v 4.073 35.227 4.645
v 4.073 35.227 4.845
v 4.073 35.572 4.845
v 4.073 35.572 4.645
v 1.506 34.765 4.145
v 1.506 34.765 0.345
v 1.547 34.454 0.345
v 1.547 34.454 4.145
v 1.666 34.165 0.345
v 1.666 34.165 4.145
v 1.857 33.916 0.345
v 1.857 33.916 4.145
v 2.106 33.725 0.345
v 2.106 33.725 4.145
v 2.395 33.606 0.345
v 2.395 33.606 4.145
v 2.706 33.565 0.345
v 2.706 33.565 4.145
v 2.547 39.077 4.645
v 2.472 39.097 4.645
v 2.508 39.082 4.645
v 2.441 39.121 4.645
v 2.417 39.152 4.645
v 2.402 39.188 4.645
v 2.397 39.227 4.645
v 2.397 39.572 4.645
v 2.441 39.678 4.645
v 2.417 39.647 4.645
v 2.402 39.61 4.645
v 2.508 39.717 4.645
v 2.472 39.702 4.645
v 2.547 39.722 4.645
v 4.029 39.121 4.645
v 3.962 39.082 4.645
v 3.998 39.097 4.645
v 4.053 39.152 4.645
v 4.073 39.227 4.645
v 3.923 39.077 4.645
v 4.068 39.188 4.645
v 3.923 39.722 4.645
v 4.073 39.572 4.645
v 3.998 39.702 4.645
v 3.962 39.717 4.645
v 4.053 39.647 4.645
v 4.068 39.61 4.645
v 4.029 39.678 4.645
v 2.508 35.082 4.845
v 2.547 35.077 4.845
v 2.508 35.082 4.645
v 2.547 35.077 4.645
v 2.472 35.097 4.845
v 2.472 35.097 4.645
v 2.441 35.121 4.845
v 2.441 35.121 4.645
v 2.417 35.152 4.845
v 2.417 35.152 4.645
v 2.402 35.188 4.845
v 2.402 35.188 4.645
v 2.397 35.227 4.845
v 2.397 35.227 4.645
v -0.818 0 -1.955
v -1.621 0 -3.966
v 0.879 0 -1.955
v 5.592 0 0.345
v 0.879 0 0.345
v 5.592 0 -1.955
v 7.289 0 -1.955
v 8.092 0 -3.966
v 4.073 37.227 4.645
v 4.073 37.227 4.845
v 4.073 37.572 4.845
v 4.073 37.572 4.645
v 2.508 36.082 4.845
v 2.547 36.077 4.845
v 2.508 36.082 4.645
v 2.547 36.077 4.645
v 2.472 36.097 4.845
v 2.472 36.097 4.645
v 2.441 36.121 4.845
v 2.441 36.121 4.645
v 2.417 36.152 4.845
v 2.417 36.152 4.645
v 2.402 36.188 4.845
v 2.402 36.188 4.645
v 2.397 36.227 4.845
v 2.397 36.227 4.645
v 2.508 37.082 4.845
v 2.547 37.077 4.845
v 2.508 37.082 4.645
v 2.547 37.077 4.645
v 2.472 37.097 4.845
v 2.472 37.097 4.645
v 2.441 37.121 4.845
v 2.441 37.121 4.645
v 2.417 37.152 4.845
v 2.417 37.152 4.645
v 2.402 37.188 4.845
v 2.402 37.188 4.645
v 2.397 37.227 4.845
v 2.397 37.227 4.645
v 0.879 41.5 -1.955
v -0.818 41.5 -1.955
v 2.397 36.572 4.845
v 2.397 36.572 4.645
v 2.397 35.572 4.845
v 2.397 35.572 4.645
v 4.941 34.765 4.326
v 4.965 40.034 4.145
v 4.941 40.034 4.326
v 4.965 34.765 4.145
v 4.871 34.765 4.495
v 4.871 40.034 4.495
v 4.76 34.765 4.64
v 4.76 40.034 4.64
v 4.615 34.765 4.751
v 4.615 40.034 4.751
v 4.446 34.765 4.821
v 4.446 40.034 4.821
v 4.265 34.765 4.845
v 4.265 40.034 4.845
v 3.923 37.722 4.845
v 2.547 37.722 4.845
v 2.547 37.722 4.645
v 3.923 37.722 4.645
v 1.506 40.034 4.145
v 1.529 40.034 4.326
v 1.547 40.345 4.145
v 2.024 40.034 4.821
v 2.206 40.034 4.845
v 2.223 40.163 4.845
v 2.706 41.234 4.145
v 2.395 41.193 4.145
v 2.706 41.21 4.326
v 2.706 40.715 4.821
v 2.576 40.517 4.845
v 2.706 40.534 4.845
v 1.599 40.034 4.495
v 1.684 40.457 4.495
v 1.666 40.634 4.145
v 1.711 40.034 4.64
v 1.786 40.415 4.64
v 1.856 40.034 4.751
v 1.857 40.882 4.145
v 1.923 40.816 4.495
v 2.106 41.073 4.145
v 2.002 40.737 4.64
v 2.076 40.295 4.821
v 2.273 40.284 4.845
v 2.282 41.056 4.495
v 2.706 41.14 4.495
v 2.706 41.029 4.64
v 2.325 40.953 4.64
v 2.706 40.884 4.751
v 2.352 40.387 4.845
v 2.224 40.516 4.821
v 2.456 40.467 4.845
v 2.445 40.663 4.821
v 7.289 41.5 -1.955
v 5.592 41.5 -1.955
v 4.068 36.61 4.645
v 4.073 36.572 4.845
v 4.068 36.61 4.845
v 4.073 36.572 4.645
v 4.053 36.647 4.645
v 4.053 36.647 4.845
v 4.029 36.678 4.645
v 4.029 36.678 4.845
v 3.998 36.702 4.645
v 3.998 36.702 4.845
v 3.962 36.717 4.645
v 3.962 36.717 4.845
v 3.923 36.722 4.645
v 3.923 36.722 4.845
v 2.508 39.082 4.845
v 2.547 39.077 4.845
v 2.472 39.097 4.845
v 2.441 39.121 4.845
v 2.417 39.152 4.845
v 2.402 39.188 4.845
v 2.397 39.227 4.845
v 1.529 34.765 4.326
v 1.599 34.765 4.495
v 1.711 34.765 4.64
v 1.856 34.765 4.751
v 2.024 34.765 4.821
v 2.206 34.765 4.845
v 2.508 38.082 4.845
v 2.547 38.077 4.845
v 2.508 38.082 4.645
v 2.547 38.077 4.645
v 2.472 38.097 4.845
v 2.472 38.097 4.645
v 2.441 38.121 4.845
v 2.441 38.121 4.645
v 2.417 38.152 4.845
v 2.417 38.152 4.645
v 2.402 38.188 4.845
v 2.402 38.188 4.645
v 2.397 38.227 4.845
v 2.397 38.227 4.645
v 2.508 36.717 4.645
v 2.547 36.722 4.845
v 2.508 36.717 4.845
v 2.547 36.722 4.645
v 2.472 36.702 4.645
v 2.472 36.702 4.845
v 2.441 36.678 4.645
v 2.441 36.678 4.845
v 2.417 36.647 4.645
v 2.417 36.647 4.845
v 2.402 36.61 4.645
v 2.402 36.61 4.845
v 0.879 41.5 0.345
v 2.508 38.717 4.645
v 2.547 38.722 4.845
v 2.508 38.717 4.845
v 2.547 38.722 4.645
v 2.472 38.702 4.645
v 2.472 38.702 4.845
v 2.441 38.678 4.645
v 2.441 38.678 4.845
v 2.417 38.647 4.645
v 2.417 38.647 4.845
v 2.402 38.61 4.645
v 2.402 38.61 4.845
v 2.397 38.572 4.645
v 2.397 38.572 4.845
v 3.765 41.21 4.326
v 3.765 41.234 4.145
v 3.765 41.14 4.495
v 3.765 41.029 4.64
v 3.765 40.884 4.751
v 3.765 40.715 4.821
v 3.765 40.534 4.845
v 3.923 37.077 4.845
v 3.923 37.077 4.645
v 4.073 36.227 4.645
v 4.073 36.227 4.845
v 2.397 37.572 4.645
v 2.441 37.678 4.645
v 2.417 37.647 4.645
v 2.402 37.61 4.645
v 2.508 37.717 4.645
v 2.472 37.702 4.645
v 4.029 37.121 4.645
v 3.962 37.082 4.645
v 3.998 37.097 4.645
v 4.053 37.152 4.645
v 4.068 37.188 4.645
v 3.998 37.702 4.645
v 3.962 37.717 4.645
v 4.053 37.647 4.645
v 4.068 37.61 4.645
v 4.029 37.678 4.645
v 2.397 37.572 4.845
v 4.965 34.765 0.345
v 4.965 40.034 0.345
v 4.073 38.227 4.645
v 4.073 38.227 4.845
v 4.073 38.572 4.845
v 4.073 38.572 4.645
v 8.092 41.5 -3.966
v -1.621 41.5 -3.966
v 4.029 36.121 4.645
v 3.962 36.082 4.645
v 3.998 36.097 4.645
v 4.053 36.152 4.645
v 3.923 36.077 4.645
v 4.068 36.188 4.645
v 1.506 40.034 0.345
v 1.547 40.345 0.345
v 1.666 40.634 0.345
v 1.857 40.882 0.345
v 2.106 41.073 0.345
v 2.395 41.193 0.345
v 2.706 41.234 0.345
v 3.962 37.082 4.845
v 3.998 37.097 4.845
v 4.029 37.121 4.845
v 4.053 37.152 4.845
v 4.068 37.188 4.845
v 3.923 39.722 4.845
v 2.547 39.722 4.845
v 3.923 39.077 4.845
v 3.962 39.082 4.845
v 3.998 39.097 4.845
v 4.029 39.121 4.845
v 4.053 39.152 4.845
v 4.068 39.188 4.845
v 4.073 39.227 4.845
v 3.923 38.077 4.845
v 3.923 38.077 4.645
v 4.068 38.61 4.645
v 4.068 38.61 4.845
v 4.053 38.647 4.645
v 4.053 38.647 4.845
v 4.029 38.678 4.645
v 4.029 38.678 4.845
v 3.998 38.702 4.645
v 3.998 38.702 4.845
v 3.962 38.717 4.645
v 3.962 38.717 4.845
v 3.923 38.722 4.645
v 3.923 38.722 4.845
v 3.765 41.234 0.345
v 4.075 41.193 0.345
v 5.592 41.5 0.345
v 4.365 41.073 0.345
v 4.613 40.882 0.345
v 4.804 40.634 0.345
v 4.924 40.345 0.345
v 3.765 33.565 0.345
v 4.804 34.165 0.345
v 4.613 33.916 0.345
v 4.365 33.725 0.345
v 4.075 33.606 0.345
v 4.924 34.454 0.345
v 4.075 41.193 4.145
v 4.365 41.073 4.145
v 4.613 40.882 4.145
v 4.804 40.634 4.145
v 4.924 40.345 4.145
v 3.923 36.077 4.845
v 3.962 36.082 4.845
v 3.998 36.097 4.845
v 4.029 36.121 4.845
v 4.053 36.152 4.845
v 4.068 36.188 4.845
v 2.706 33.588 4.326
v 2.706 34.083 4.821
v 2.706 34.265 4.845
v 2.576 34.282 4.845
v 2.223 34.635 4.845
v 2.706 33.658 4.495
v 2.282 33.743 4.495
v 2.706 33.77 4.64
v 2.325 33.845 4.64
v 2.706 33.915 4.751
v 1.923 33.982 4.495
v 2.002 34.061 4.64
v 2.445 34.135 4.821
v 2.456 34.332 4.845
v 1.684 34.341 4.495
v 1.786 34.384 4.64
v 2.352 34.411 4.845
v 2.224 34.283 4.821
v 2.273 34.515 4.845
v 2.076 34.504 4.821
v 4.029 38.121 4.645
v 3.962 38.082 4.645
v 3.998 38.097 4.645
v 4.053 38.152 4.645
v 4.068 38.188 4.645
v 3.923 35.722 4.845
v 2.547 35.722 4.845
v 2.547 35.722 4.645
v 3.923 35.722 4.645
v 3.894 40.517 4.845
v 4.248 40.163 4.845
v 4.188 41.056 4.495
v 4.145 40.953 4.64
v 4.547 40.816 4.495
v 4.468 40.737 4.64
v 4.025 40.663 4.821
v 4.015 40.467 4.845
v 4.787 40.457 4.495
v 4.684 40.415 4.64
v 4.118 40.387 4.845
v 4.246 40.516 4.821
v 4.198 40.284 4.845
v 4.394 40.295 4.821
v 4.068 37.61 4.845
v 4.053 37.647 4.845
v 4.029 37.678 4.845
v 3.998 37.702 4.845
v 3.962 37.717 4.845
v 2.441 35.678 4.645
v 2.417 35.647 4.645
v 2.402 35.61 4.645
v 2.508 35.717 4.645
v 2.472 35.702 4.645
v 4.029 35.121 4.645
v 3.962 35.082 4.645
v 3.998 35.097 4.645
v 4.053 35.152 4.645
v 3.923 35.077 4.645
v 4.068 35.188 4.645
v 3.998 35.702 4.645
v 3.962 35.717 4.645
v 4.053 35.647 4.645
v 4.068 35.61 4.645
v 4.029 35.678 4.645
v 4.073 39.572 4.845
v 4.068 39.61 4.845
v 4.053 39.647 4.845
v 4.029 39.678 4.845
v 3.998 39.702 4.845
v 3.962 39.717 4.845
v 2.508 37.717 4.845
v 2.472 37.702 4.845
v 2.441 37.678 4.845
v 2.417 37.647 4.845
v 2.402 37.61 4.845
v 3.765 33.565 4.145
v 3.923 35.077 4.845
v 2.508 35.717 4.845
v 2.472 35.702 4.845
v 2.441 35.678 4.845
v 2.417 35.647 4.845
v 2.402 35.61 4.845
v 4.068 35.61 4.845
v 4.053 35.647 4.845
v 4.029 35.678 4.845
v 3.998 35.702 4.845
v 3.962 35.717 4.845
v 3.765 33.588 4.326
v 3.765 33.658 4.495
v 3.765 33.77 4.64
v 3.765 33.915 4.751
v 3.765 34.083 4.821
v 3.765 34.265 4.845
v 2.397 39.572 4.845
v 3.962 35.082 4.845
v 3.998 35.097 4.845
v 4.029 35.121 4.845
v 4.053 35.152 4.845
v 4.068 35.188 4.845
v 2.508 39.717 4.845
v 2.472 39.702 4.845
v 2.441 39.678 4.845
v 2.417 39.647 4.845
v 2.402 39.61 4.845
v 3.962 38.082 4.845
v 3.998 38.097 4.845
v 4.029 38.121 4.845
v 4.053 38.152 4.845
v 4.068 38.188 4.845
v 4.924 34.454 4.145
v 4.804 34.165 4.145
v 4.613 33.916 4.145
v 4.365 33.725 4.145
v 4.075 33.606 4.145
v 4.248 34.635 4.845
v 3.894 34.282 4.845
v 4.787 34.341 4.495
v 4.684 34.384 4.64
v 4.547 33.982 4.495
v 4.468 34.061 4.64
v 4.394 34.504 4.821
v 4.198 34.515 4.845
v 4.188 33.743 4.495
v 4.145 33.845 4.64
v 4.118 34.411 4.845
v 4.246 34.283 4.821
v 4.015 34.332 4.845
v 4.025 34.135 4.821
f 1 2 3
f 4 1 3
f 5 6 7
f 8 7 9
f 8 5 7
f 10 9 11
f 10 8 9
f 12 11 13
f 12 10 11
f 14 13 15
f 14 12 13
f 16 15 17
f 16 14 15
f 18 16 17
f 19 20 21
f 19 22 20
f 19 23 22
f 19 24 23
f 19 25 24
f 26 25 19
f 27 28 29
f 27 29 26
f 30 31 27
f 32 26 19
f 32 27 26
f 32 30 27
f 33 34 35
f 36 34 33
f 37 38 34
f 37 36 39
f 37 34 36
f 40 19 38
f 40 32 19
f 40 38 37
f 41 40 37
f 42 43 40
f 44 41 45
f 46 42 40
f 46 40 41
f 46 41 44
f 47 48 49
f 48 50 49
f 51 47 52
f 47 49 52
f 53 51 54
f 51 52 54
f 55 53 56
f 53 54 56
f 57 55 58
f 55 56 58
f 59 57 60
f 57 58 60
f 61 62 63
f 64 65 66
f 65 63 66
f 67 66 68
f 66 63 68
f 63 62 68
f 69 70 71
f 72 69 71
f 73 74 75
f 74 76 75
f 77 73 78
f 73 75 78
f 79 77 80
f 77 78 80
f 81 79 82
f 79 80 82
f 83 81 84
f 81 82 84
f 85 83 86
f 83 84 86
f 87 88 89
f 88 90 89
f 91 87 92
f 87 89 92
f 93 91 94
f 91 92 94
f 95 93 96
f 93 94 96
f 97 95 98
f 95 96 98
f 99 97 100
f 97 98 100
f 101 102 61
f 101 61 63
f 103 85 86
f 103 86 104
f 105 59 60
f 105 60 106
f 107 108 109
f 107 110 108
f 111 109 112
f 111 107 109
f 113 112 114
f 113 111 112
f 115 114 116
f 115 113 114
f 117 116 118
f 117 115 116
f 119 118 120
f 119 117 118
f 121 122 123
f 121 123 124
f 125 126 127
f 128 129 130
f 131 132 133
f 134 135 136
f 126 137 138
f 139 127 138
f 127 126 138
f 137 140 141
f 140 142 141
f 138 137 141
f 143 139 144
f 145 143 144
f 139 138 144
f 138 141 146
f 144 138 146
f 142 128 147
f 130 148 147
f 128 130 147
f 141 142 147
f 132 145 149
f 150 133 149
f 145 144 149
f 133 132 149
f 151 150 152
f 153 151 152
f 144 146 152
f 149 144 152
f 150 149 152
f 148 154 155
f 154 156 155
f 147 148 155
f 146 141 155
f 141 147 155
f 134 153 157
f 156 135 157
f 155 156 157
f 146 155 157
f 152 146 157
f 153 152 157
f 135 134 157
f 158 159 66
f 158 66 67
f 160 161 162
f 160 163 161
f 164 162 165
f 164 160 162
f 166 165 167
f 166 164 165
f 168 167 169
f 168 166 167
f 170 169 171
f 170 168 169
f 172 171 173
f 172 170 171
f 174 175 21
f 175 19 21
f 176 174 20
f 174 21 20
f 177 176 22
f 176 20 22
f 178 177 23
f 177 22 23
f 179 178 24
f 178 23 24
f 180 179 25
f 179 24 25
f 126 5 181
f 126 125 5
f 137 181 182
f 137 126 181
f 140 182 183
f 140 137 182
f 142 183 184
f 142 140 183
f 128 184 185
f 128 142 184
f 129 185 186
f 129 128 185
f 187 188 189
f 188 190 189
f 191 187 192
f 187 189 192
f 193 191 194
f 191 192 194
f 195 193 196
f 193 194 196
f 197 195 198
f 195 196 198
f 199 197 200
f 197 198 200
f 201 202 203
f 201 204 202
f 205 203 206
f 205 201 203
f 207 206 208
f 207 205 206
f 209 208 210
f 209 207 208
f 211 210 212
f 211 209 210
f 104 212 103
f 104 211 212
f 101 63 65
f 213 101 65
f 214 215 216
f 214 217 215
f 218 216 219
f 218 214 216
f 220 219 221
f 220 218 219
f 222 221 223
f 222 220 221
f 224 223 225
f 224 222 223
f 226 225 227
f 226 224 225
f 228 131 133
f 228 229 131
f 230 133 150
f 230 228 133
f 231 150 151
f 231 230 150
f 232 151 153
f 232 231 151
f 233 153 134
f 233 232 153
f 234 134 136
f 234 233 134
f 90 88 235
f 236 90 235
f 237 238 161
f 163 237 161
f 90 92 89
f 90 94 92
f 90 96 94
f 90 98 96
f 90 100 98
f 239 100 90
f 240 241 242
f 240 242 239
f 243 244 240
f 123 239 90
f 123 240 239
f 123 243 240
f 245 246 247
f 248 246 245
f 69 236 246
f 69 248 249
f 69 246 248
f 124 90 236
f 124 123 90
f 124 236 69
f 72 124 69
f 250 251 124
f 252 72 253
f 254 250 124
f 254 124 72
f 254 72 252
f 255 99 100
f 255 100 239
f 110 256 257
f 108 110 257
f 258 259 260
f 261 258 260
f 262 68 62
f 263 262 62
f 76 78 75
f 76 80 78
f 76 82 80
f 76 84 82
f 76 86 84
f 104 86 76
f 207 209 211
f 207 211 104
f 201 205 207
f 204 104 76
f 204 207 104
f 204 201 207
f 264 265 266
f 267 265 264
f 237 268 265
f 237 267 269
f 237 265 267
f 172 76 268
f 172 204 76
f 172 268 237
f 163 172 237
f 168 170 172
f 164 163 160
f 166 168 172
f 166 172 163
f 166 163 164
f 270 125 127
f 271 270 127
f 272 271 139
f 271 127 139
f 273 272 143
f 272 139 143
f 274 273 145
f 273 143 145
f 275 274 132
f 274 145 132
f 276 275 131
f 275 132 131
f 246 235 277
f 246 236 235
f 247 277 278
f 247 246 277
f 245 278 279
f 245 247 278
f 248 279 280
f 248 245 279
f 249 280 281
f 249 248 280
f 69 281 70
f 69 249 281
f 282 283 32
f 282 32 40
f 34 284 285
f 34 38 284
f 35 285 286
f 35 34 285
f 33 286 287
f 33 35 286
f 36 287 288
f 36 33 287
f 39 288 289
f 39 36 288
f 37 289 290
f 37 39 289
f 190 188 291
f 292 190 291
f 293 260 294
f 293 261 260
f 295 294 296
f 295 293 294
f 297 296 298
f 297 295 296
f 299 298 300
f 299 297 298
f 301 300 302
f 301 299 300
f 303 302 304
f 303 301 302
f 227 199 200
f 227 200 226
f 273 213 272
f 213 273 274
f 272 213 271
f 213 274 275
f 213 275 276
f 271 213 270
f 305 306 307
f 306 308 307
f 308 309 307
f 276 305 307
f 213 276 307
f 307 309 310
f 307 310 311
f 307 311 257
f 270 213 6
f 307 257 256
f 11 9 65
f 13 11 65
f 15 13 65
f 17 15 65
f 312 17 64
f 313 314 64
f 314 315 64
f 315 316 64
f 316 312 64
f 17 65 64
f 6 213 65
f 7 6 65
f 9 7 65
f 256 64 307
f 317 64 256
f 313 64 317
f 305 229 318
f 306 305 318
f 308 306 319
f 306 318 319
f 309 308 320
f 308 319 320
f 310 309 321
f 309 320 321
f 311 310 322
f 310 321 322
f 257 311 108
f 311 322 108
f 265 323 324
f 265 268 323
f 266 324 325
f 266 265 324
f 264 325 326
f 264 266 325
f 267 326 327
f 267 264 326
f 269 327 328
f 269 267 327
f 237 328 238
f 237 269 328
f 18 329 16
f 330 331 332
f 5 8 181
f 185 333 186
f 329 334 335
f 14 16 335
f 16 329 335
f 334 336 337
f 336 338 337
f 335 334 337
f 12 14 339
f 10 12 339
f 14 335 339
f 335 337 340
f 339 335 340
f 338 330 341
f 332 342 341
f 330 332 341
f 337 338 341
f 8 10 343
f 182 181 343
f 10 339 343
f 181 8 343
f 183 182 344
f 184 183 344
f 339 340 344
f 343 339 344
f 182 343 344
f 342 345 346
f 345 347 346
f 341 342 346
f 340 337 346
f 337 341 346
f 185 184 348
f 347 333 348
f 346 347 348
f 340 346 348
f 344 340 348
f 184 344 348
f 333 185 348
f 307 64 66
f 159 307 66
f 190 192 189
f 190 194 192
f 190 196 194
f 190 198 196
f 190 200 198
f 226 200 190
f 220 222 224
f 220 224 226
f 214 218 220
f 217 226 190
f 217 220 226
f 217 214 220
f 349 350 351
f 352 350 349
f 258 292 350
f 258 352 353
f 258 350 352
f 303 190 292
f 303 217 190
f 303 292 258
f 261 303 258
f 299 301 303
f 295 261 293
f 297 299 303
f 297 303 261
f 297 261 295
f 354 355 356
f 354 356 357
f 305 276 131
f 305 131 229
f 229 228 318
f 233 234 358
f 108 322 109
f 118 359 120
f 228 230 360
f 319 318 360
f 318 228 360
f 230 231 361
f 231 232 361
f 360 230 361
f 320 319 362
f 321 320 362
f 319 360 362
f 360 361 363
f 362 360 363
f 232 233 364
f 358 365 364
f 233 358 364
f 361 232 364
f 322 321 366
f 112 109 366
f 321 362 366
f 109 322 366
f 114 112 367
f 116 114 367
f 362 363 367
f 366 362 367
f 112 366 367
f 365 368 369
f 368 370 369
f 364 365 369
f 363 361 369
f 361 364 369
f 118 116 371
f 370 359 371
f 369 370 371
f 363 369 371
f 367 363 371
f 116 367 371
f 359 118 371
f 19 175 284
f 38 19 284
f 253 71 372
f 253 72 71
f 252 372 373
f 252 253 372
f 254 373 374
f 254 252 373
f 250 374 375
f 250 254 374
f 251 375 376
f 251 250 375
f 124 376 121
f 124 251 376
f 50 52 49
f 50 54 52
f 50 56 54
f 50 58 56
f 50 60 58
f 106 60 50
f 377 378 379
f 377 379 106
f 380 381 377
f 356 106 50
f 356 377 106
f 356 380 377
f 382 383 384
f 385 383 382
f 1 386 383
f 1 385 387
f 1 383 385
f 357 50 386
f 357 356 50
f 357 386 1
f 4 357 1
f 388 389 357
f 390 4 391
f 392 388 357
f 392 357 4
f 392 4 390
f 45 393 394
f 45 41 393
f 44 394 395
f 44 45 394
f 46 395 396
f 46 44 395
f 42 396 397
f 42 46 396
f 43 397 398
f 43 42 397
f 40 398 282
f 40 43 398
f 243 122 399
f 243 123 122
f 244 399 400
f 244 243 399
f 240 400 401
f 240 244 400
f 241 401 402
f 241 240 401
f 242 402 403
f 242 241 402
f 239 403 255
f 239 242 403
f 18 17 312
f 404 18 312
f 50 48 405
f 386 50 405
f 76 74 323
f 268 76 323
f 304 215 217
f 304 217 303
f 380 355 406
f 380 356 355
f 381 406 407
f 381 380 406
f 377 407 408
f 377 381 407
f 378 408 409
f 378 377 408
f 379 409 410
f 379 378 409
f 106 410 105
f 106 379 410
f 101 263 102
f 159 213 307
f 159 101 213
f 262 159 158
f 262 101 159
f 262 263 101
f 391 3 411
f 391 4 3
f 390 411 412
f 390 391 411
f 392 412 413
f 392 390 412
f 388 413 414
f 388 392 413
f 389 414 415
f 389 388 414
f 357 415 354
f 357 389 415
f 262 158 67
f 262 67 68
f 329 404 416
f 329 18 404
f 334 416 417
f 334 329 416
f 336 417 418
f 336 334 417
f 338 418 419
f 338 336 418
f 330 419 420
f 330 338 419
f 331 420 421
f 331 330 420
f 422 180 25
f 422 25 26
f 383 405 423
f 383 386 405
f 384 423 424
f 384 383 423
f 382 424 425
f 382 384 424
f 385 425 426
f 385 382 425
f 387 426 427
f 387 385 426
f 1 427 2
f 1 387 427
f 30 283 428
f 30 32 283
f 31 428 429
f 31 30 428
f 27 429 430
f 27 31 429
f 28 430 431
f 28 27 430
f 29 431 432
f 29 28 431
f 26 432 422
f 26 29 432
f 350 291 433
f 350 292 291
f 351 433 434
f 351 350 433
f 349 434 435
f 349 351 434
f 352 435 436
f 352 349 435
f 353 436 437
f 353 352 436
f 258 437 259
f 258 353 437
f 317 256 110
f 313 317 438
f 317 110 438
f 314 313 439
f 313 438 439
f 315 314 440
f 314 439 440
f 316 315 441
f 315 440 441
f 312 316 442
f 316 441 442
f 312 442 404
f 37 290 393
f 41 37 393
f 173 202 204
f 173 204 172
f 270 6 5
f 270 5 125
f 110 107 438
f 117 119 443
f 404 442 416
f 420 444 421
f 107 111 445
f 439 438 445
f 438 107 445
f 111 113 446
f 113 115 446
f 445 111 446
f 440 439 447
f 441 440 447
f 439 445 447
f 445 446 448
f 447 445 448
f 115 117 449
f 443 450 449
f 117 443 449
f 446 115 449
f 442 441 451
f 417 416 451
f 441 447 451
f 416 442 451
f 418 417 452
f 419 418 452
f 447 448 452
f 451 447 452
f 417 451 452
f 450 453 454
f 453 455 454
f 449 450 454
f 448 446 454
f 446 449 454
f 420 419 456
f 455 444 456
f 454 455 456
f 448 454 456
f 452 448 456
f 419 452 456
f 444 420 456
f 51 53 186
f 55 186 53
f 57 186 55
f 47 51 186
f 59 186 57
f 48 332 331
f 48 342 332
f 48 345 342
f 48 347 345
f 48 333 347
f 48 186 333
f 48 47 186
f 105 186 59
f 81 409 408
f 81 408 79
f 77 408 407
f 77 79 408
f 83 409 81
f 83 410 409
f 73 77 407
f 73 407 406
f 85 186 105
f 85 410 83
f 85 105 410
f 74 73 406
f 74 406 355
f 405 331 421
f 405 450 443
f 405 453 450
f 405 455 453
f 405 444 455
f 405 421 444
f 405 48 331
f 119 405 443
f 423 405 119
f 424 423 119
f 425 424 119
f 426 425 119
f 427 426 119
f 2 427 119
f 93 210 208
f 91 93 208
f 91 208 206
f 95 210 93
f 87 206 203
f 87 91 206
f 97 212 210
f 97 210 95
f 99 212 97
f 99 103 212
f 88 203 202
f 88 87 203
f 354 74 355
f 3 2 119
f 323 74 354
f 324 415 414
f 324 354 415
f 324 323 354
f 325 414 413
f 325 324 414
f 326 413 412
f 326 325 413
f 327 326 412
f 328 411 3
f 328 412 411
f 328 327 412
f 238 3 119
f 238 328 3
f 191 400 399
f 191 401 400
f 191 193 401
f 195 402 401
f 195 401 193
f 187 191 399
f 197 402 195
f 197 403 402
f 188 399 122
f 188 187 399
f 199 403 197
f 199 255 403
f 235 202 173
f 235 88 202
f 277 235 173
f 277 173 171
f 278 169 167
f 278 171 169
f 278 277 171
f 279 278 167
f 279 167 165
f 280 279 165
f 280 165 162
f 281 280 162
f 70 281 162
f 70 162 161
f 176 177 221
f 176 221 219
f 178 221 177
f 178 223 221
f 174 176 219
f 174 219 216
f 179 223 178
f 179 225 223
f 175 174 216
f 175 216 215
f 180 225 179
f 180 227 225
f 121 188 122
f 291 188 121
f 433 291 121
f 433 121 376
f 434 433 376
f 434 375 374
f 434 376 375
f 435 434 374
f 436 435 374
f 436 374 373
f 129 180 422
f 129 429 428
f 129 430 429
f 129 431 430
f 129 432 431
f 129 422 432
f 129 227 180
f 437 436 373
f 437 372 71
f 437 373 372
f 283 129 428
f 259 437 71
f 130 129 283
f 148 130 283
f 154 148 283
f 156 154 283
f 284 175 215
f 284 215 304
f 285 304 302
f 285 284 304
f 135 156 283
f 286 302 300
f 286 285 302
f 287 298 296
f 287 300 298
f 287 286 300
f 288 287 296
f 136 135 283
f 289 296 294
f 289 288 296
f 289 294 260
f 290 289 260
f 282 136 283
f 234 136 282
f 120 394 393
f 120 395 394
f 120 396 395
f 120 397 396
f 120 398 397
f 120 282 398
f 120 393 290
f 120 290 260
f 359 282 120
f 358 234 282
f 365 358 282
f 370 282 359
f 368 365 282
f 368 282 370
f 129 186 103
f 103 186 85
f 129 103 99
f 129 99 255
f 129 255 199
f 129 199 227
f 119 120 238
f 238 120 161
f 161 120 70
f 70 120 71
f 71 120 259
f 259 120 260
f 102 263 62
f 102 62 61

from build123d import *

# Parameters (mm, degrees)
BOSS_EXTRUDE1_DEPTH        = 41.5
SKETCH2_W                  = 3.459033884
SKETCH2_H                  = 7.669300129
BOSS_EXTRUDE2_DEPTH        = 4.5
FILLET1_R                  = 1.2
FILLET2_R                  = 0.7
SKETCH3_W                  = 1.676518228
SKETCH3_H                  = 0.644745983
CUT_EXTRUDE1_DEPTH         = 0.2
FILLET3_R                  = 0.15
LPATTERN1_COUNT            = 3
LPATTERN1_PITCH            = 1
FILLET3_OF_LPATTERN1_R     = 0.15
LPATTERN1_COL_COUNT        = 3
LPATTERN1_COL_PITCH        = 1
FILLET3_OF_LPATTERN1_COL_R = 0.15


with BuildPart() as part:
    # Sketch1 → Boss-Extrude1 (new body)
    with BuildSketch(Plane(origin=(0, 0, 0), x_dir=(1, 0, 0), z_dir=(0, 1, 0))):
        Polygon((0.878746859, -0.34499804), (5.591575223, -0.34499804), (5.591575223, 1.95500196), (7.288815202, 1.95500196), (8.091575223, 3.966300559), (-1.621253141, 3.966300559), (-0.81849312, 1.95500196), (0.878746859, 1.95500196), align=None)
    extrude(amount=BOSS_EXTRUDE1_DEPTH)

    # Sketch2 → Boss-Extrude2 (add)
    with BuildSketch(Plane.XY.offset(0.34499804)):
        with Locations((3.235161041, 37.399269449)):
            Rectangle(SKETCH2_W, SKETCH2_H)
    extrude(amount=BOSS_EXTRUDE2_DEPTH)

    # Fillet1
    fillet1_edges = [part.edges().sort_by_distance(p)[0] for p in [
        (1.505644099, 41.233919514, 2.59499804),
        (1.505644099, 33.564619385, 2.59499804),
        (4.964677983, 33.564619385, 2.59499804),
        (4.964677983, 41.233919514, 2.59499804),
    ]]
    fillet(fillet1_edges, radius=FILLET1_R)

    # Fillet2
    fillet2_edges = [part.edges().sort_by_distance(p)[0] for p in [
        (3.235161041, 41.233919514, 4.84499804),
        (4.964677983, 37.399269449, 4.84499804),
        (1.505644099, 37.399269449, 4.84499804),
        (3.235161041, 33.564619385, 4.84499804),
        (4.613206121, 33.916091248, 4.84499804),
        (1.857115961, 33.916091248, 4.84499804),
        (1.857115961, 40.882447651, 4.84499804),
        (4.613206121, 40.882447651, 4.84499804),
    ]]
    fillet(fillet2_edges, radius=FILLET2_R)

    # Sketch3 → Cut-Extrude1 (cut)
    with BuildSketch(Plane.XY.offset(4.84499804)):
        with Locations((3.235161041, 37.399269449)):
            Rectangle(SKETCH3_W, SKETCH3_H)
    cut_extrude1 = extrude(amount=-CUT_EXTRUDE1_DEPTH, mode=Mode.SUBTRACT)

    # Fillet3
    fillet3_edges = [part.edges().sort_by_distance(p)[0] for p in [
        (2.396901927, 37.076896458, 4.74499804),
        (2.396901927, 37.721642441, 4.74499804),
        (4.073420155, 37.721642441, 4.74499804),
        (4.073420155, 37.076896458, 4.74499804),
    ]]
    fillet(fillet3_edges, radius=FILLET3_R)

    # LPattern1: Cut-Extrude1 ×3
    with Locations(*[(0, i * LPATTERN1_PITCH, 0) for i in range(1, LPATTERN1_COUNT)]):
        add(cut_extrude1, mode=Mode.SUBTRACT)

    # Fillet3 of LPattern1
    fillet3_of_lpattern1_edges = [part.edges().sort_by_distance(p)[0] for p in [
        (2.396901927, 38.076896458, 4.74499804),
        (2.396901927, 38.721642441, 4.74499804),
        (4.073420155, 38.721642441, 4.74499804),
        (4.073420155, 38.076896458, 4.74499804),
        (2.396901927, 39.076896458, 4.74499804),
        (2.396901927, 39.721642441, 4.74499804),
        (4.073420155, 39.721642441, 4.74499804),
        (4.073420155, 39.076896458, 4.74499804),
    ]]
    fillet(fillet3_of_lpattern1_edges, radius=FILLET3_OF_LPATTERN1_R)

    # LPattern1 col: Cut-Extrude1 ×3
    with Locations(*[(0, -i * LPATTERN1_COL_PITCH, 0) for i in range(1, LPATTERN1_COL_COUNT)]):
        add(cut_extrude1, mode=Mode.SUBTRACT)

    # Fillet3 of LPattern1 col
    fillet3_of_lpattern1_col_edges = [part.edges().sort_by_distance(p)[0] for p in [
        (2.396901927, 36.076896458, 4.74499804),
        (2.396901927, 36.721642441, 4.74499804),
        (4.073420155, 36.721642441, 4.74499804),
        (4.073420155, 36.076896458, 4.74499804),
        (2.396901927, 35.076896458, 4.74499804),
        (2.396901927, 35.721642441, 4.74499804),
        (4.073420155, 35.721642441, 4.74499804),
        (4.073420155, 35.076896458, 4.74499804),
    ]]
    fillet(fillet3_of_lpattern1_col_edges, radius=FILLET3_OF_LPATTERN1_COL_R)


solid = part.part
